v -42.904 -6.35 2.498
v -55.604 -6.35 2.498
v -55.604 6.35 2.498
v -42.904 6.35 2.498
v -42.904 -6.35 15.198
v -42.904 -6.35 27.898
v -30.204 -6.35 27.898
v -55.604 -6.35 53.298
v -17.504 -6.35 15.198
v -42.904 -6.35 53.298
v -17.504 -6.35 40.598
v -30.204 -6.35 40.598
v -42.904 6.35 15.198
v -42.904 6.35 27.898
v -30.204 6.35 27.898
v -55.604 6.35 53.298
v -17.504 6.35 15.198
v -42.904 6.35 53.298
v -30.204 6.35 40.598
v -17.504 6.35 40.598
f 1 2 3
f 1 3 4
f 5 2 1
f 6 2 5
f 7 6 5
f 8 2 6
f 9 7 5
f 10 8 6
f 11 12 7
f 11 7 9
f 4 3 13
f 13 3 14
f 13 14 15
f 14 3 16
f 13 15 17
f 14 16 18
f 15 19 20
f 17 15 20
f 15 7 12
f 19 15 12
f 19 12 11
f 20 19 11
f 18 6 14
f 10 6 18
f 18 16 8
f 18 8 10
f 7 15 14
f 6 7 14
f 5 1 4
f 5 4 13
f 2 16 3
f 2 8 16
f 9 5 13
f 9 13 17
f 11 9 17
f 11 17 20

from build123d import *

# Parameters (mm, degrees)
F0_W     = 12.7
F0_H     = 12.7
F1_DEPTH = 6.35


with BuildPart() as f1:
    # F0 (on Front) → F1 (new body, symmetric)
    with BuildSketch(Plane.XZ):
        with Locations((-49.254278, 46.948222)):
            Rectangle(F0_W, F0_H)
        with Locations((-49.254278, 34.248222)):
            Rectangle(F0_W, F0_H)
        with Locations((-49.254278, 21.548222)):
            Rectangle(F0_W, F0_H)
        with Locations((-36.554278, 21.548222)):
            Rectangle(F0_W, F0_H)
        with Locations((-49.254278, 8.848222)):
            Rectangle(F0_W, F0_H)
        with Locations((-23.854278, 21.548222)):
            Rectangle(F0_W, F0_H)
        with Locations((-23.854278, 34.248222)):
            Rectangle(F0_W, F0_H)
    extrude(amount=F1_DEPTH, both=True)


solid = f1.part
